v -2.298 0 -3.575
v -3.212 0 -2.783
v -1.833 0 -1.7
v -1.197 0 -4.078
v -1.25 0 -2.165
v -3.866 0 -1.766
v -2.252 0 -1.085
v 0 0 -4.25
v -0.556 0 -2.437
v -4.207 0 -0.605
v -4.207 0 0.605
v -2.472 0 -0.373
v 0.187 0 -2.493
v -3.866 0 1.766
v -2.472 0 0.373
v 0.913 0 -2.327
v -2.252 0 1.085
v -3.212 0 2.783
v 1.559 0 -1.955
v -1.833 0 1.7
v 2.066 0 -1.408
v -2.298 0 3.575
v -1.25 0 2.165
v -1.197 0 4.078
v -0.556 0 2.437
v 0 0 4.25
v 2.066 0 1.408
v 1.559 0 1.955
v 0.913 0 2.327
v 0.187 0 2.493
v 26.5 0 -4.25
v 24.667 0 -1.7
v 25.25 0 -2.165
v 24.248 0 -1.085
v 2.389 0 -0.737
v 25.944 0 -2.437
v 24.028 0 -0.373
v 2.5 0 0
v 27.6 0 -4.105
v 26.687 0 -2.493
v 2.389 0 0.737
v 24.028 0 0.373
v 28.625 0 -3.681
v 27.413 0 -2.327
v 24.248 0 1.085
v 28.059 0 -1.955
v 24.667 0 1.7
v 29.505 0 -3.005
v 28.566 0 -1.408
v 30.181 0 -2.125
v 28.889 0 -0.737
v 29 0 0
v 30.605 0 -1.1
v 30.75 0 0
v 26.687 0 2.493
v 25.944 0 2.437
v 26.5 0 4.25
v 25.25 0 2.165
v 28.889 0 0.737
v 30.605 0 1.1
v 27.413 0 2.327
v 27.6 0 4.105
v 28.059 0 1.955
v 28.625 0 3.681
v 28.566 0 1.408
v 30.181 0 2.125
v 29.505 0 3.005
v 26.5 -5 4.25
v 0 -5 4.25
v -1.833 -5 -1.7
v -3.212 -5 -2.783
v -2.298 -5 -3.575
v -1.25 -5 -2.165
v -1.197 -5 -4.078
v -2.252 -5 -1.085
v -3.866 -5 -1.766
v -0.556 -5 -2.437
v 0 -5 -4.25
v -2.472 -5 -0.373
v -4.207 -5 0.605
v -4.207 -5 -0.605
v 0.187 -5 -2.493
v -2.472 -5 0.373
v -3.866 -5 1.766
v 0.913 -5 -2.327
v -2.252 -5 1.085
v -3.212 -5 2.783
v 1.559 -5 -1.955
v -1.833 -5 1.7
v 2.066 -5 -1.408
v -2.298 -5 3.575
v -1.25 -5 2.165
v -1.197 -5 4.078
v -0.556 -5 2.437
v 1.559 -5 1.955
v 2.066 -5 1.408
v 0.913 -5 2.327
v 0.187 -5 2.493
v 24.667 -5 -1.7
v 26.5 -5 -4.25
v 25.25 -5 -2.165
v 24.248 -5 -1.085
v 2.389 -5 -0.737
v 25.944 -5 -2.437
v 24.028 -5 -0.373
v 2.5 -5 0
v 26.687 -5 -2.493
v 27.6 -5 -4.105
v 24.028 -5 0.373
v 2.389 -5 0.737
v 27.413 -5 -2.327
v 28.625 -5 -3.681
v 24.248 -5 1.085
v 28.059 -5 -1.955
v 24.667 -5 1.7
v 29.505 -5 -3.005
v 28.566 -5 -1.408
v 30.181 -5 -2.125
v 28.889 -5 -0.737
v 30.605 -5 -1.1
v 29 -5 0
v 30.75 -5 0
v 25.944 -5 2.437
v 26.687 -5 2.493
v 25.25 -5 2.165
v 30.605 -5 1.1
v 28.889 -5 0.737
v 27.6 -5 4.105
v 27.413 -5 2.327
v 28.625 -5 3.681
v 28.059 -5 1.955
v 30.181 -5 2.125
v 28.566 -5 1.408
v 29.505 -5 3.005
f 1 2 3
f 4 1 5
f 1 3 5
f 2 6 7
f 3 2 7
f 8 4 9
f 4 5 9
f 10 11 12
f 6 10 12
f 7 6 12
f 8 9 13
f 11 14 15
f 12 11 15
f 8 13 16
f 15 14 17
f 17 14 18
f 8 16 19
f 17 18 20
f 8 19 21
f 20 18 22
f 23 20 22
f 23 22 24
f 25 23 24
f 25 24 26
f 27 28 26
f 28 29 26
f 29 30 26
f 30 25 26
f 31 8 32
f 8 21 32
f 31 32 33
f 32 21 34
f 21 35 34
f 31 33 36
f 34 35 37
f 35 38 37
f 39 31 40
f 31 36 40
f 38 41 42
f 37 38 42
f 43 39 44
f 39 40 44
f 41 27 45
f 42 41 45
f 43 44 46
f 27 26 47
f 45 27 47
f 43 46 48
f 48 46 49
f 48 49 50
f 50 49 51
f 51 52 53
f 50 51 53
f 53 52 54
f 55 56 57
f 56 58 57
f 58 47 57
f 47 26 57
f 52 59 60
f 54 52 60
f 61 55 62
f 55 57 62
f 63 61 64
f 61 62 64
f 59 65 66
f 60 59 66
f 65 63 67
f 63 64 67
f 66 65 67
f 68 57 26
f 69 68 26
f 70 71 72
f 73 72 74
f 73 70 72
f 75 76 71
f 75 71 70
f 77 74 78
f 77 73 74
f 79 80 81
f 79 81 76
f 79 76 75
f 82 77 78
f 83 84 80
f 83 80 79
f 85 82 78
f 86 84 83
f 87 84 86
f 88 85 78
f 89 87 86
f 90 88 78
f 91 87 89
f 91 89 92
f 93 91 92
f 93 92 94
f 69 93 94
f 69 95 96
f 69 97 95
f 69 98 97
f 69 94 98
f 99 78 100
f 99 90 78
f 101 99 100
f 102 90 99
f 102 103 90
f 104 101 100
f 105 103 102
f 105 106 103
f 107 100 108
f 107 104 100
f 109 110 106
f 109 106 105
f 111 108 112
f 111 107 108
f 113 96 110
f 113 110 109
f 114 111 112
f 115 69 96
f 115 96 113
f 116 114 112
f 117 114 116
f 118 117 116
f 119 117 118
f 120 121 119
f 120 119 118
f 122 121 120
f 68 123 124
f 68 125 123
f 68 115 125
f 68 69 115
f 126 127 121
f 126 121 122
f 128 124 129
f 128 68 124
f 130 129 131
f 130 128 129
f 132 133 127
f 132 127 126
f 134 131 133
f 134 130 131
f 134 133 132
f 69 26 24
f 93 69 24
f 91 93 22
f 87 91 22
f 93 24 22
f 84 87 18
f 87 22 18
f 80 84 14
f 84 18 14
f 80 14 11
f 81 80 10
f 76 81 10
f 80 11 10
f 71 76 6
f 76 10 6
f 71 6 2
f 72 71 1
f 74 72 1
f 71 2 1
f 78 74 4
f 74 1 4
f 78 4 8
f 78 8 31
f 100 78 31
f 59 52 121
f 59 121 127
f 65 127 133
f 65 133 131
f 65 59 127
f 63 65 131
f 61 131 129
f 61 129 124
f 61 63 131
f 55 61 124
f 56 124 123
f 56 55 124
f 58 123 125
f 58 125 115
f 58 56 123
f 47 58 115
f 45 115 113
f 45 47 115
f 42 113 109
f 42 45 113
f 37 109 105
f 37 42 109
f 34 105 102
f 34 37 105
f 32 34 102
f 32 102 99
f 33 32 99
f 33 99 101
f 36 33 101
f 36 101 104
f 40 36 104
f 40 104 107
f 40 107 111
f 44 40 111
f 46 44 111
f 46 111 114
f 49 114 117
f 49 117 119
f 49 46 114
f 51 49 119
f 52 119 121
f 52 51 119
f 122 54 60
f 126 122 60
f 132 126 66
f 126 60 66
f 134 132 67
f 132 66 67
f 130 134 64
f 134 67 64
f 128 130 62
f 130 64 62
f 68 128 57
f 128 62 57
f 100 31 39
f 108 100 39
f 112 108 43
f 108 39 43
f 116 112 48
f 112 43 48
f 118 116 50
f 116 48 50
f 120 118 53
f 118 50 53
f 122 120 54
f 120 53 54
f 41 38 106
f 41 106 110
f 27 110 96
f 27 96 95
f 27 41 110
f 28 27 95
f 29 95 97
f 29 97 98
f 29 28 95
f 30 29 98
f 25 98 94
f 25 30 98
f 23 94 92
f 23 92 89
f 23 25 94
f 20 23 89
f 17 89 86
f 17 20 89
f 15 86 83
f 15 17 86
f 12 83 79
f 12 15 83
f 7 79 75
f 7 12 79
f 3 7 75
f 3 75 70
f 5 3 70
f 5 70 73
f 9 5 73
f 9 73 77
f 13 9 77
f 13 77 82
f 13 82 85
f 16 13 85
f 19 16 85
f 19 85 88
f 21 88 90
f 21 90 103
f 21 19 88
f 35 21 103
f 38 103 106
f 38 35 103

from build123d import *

# Parameters (mm, degrees)
F0_R     = 2.5
F1_DEPTH = 5


with BuildPart() as f1:
    # F0 (on Front) → F1 (new body)
    with BuildSketch(Plane.XZ):
        with BuildLine():
            ThreePointArc((0, -4.25), (3.005204, -3.005204), (4.25, 0))
            ThreePointArc((4.25, 0), (3.005204, 3.005204), (0, 4.25))
            ThreePointArc((0, 4.25), (-4.25, 0), (0, -4.25))
        make_face()
        Circle(F0_R, mode=Mode.SUBTRACT)
        with BuildLine():
            ThreePointArc((30.75, 0), (29.505204, 3.005204), (26.5, 4.25))
            ThreePointArc((26.5, 4.25), (22.25, 0), (26.5, -4.25))
            ThreePointArc((26.5, -4.25), (29.505204, -3.005204), (30.75, 0))
        make_face()
        with Locations((26.5, 0)):
            Circle(F0_R, mode=Mode.SUBTRACT)
        with BuildLine():
            ThreePointArc((0, 4.25), (3.005204, 3.005204), (4.25, 0))
            ThreePointArc((4.25, 0), (3.005204, -3.005204), (0, -4.25))
            Line((0, -4.25), (26.5, -4.25))
            ThreePointArc((26.5, -4.25), (22.25, 0), (26.5, 4.25))
            Line((26.5, 4.25), (0, 4.25))
        make_face()
    extrude(amount=F1_DEPTH)


solid = f1.part
